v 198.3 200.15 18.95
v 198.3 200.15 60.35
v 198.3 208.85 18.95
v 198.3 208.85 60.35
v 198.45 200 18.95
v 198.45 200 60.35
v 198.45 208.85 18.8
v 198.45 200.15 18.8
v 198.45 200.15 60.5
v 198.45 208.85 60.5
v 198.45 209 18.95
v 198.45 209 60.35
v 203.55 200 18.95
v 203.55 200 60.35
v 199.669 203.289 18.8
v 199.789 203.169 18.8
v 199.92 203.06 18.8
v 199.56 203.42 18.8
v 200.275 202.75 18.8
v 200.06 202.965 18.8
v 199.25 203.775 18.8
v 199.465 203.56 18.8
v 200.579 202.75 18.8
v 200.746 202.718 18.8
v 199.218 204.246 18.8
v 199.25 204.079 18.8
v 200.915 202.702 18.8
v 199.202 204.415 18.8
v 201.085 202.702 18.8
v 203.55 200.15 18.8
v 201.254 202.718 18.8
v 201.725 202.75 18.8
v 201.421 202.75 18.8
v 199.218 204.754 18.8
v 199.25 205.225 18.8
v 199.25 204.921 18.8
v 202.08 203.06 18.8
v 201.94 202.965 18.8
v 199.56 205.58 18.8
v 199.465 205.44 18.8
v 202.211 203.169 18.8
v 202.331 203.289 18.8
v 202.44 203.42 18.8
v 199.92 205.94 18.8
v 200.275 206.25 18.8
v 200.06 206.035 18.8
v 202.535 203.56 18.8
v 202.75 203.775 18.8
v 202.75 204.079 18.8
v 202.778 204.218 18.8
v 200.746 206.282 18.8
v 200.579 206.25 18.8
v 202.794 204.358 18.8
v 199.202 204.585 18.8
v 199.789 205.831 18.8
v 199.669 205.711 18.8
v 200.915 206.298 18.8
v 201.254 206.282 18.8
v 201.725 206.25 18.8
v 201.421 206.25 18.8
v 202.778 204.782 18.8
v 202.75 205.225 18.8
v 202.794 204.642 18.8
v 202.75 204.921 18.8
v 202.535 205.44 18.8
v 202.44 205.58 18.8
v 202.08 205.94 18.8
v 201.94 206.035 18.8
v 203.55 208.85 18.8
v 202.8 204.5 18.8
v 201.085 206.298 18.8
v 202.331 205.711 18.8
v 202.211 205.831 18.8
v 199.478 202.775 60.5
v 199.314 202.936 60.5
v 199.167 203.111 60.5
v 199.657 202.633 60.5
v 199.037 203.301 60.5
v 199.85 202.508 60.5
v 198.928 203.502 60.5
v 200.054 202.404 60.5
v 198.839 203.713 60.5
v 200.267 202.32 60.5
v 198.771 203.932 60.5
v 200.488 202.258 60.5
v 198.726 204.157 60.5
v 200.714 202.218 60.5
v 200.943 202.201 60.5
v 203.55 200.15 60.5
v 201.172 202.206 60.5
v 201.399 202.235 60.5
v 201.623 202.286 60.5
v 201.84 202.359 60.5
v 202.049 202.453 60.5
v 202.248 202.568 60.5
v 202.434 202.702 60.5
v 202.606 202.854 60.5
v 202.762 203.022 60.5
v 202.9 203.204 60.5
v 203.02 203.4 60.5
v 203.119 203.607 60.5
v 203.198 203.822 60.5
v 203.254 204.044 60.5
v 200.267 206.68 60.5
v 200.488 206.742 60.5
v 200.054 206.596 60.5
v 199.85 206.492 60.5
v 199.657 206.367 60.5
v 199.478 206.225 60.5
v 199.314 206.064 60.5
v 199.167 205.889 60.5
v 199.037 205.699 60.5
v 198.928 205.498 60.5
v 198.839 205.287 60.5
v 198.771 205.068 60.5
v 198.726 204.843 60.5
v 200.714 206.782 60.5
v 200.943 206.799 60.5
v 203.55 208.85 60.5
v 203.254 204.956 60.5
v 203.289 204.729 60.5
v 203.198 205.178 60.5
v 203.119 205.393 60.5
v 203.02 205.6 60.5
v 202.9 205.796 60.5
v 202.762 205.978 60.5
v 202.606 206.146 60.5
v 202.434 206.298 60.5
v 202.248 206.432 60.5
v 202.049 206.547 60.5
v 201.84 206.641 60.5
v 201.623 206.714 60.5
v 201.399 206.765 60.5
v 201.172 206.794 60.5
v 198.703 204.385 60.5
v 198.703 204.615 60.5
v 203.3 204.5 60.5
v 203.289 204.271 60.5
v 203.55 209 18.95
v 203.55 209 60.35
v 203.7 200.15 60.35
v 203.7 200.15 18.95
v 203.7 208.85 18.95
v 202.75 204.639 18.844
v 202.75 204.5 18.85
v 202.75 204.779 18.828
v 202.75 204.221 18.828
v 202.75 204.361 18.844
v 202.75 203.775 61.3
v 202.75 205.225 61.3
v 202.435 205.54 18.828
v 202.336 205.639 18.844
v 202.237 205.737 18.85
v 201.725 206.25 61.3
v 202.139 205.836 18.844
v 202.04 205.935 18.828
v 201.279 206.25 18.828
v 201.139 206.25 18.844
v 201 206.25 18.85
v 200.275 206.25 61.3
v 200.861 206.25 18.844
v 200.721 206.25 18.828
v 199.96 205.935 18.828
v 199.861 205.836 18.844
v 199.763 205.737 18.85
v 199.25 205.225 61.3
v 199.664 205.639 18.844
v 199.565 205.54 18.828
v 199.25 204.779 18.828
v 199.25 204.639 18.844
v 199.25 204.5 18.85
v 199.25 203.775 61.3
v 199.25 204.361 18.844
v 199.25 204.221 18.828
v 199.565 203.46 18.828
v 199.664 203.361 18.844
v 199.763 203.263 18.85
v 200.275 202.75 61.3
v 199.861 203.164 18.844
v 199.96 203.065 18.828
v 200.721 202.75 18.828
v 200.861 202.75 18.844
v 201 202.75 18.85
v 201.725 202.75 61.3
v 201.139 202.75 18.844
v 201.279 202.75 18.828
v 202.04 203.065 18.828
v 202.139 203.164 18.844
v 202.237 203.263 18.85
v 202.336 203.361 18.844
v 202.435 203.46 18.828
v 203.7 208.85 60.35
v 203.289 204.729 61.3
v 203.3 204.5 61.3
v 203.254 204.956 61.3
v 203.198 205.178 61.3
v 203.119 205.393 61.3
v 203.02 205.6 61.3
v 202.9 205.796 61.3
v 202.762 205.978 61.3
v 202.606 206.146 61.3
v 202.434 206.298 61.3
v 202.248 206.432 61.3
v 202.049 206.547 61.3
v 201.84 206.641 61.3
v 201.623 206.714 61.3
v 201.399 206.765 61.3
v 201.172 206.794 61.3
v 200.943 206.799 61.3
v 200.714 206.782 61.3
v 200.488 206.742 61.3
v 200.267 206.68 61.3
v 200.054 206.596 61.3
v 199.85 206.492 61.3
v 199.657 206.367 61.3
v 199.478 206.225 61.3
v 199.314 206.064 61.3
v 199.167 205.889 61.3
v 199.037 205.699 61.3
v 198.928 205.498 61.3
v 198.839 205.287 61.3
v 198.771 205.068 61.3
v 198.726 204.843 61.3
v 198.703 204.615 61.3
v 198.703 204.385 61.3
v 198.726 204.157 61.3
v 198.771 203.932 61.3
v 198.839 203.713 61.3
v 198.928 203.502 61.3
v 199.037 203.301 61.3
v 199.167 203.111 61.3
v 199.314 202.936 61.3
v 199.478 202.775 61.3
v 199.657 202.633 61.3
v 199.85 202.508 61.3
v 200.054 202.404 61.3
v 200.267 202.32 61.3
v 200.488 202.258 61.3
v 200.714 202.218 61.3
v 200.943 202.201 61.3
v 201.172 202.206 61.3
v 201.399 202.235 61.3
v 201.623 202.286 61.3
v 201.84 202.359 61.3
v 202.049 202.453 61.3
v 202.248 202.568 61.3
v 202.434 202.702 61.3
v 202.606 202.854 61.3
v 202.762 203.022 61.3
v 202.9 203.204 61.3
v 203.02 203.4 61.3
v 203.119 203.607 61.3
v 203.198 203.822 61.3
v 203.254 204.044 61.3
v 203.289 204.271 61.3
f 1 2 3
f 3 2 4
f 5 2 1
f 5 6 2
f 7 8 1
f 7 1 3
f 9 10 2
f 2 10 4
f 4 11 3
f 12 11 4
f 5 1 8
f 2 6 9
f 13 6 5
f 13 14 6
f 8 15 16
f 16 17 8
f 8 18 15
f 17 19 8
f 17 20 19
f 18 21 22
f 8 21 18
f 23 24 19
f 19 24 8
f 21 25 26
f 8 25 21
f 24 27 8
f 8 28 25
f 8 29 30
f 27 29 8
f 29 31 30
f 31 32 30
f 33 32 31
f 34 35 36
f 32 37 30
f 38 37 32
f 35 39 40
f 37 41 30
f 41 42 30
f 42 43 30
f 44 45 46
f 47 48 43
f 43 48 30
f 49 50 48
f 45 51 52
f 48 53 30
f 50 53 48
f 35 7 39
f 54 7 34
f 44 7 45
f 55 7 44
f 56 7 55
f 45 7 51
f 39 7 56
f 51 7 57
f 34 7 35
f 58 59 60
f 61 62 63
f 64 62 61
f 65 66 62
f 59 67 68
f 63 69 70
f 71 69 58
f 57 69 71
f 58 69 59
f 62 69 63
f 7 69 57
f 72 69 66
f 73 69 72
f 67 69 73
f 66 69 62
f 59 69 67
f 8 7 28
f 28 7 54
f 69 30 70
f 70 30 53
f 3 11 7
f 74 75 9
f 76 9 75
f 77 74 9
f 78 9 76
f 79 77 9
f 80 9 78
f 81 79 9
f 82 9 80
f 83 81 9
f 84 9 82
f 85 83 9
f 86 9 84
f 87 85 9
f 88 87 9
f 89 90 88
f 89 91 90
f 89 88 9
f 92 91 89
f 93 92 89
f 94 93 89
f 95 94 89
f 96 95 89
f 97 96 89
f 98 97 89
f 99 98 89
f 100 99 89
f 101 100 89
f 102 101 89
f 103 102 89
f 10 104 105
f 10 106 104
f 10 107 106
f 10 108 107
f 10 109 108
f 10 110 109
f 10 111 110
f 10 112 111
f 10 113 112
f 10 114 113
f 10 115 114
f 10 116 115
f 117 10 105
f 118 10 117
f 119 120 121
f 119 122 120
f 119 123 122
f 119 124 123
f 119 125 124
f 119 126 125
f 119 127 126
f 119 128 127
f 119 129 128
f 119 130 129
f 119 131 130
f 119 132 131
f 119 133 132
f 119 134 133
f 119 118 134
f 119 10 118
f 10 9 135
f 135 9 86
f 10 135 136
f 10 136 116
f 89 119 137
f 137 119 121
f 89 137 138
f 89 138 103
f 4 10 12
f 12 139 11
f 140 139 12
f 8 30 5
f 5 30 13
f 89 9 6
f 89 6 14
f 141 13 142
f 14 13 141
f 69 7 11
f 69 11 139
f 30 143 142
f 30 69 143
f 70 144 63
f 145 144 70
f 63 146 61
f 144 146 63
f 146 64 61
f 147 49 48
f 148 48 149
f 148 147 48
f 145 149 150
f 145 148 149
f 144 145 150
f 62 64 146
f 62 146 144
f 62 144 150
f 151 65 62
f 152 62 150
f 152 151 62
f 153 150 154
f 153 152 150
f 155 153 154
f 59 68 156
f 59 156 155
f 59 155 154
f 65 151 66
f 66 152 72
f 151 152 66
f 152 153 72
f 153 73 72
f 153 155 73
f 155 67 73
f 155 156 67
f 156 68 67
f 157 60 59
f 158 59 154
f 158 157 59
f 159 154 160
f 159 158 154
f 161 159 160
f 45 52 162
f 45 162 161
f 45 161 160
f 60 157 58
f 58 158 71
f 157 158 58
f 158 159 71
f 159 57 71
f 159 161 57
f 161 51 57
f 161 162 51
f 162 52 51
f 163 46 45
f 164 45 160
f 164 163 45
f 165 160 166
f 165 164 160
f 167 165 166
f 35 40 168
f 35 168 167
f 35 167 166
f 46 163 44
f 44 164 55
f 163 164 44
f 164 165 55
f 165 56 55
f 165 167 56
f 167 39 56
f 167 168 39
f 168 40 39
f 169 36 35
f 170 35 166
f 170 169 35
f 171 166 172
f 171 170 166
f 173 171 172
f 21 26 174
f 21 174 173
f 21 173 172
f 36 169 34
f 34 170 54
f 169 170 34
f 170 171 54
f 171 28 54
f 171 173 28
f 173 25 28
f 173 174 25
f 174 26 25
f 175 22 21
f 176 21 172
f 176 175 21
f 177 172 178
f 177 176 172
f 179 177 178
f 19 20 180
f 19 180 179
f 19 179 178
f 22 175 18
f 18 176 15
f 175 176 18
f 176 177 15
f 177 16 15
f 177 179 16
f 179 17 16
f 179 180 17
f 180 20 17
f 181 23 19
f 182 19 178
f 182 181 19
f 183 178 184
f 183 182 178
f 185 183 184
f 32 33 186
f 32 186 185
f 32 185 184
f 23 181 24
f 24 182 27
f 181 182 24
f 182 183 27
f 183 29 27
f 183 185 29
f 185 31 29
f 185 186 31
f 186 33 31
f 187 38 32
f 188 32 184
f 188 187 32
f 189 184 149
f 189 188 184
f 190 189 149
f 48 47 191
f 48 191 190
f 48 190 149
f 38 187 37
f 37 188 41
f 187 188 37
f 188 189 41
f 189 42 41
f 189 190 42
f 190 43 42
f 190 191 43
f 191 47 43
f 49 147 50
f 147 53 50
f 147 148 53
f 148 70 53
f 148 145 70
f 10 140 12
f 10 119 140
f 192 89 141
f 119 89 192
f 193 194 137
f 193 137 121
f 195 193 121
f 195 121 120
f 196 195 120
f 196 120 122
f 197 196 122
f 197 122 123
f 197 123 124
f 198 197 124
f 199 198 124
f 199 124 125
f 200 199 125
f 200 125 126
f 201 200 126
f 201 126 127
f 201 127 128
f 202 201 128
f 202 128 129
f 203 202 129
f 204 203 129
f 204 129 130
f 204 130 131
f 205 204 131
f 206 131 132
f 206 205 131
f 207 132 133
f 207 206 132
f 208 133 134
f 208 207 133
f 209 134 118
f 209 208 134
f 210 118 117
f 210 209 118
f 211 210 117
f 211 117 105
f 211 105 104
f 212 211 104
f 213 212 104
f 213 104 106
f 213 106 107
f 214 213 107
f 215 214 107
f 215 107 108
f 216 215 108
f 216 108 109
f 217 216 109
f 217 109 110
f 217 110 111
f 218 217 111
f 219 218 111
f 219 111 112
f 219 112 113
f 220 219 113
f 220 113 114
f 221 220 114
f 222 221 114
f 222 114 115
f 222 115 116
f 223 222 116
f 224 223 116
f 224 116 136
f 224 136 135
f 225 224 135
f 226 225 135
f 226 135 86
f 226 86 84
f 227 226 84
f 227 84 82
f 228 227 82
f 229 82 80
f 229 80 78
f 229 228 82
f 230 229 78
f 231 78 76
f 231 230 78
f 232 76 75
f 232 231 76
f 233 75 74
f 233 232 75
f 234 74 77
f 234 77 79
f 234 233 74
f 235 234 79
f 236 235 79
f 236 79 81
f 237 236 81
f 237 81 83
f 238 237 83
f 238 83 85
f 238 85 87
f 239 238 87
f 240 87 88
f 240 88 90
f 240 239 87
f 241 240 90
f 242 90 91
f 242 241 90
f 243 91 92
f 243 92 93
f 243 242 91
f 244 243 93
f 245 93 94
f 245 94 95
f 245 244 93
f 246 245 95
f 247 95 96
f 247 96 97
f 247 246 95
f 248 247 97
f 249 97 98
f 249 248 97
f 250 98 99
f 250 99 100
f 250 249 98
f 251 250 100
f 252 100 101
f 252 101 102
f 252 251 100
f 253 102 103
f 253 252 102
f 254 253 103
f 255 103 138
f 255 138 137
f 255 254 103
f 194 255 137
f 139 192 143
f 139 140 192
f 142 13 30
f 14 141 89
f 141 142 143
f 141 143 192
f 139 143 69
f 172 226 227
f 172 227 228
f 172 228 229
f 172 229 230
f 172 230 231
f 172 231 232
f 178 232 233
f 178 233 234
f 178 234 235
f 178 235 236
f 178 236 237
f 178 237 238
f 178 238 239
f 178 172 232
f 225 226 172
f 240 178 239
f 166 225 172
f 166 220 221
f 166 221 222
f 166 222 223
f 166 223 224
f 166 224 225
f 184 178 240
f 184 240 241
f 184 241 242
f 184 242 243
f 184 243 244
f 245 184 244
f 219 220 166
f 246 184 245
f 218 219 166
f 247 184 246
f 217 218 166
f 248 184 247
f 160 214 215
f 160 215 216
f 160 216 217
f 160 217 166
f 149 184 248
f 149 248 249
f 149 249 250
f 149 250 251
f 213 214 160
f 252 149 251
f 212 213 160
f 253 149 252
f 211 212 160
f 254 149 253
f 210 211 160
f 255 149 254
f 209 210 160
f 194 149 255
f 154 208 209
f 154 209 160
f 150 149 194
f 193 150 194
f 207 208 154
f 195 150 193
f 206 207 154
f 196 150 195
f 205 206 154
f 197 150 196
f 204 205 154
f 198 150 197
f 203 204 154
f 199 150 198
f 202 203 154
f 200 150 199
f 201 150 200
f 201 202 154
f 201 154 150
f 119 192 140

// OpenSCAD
// Generated by the canonical parent Python sources and validated exchange pipeline.
polyhedron(points=[[198.3000030517578, 200.14999389648438, 18.950000762939453], [198.3000030517578, 200.14999389648438, 60.349998474121094], [198.3000030517578, 208.85000610351562, 18.950000762939453], [198.3000030517578, 208.85000610351562, 60.349998474121094], [198.4499969482422, 200.0, 18.950000762939453], [198.4499969482422, 200.0, 60.349998474121094], [198.4499969482422, 208.85000610351562, 18.799999237060547], [198.4499969482422, 200.14999389648438, 18.799999237060547], [198.4499969482422, 200.14999389648438, 60.5], [198.4499969482422, 208.85000610351562, 60.5], [198.4499969482422, 209.0, 18.950000762939453], [198.4499969482422, 209.0, 60.349998474121094], [203.5500030517578, 200.0, 18.950000762939453], [203.5500030517578, 200.0, 60.349998474121094], [199.66851806640625, 203.2887420654297, 18.799999237060547], [199.7887420654297, 203.16851806640625, 18.799999237060547], [199.91978454589844, 203.06016540527344, 18.799999237060547], [199.56016540527344, 203.41978454589844, 18.799999237060547], [200.27513122558594, 202.75, 18.799999237060547], [200.0604705810547, 202.96466064453125, 18.799999237060547], [199.25, 203.77513122558594, 18.799999237060547], [199.46466064453125, 203.5604705810547, 18.799999237060547], [200.5786895751953, 202.75, 18.799999237060547], [200.74569702148438, 202.71804809570312, 18.799999237060547], [199.21804809570312, 204.24569702148438, 18.799999237060547], [199.25, 204.0786895751953, 18.799999237060547], [200.91497802734375, 202.70201110839844, 18.799999237060547], [199.20201110839844, 204.41497802734375, 18.799999237060547], [201.08502197265625, 202.70201110839844, 18.799999237060547], [203.5500030517578, 200.14999389648438, 18.799999237060547], [201.25430297851562, 202.71804809570312, 18.799999237060547], [201.72486877441406, 202.75, 18.799999237060547], [201.4213104248047, 202.75, 18.799999237060547], [199.21804809570312, 204.75430297851562, 18.799999237060547], [199.25, 205.22486877441406, 18.799999237060547], [199.25, 204.9213104248047, 18.799999237060547], [202.08021545410156, 203.06016540527344, 18.799999237060547], [201.9395294189453, 202.96466064453125, 18.799999237060547], [199.56016540527344, 205.58021545410156, 18.799999237060547], [199.46466064453125, 205.4395294189453, 18.799999237060547], [202.2112579345703, 203.16851806640625, 18.799999237060547], [202.33148193359375, 203.2887420654297, 18.799999237060547], [202.43983459472656, 203.41978454589844, 18.799999237060547], [199.91978454589844, 205.93983459472656, 18.799999237060547], [200.27513122558594, 206.25, 18.799999237060547], [200.0604705810547, 206.03533935546875, 18.799999237060547], [202.53533935546875, 203.5604705810547, 18.799999237060547], [202.75, 203.77513122558594, 18.799999237060547], [202.75, 204.0786895751953, 18.799999237060547], [202.77772521972656, 204.21766662597656, 18.799999237060547], [200.74569702148438, 206.28195190429688, 18.799999237060547], [200.5786895751953, 206.25, 18.799999237060547], [202.79441833496094, 204.3583984375, 18.799999237060547], [199.20201110839844, 204.58502197265625, 18.799999237060547], [199.7887420654297, 205.83148193359375, 18.799999237060547], [199.66851806640625, 205.7112579345703, 18.799999237060547], [200.91497802734375, 206.29798889160156, 18.799999237060547], [201.25430297851562, 206.28195190429688, 18.799999237060547], [201.72486877441406, 206.25, 18.799999237060547], [201.4213104248047, 206.25, 18.799999237060547], [202.77772521972656, 204.78233337402344, 18.799999237060547], [202.75, 205.22486877441406, 18.799999237060547], [202.79441833496094, 204.6416015625, 18.799999237060547], [202.75, 204.9213104248047, 18.799999237060547], [202.53533935546875, 205.4395294189453, 18.799999237060547], [202.43983459472656, 205.58021545410156, 18.799999237060547], [202.08021545410156, 205.93983459472656, 18.799999237060547], [201.9395294189453, 206.03533935546875, 18.799999237060547], [203.5500030517578, 208.85000610351562, 18.799999237060547], [202.8000030517578, 204.5, 18.799999237060547], [201.08502197265625, 206.29798889160156, 18.799999237060547], [202.33148193359375, 205.7112579345703, 18.799999237060547], [202.2112579345703, 205.83148193359375, 18.799999237060547], [199.47811889648438, 202.77549743652344, 60.5], [199.31398010253906, 202.93560791015625, 60.5], [199.16659545898438, 203.1112518310547, 60.5], [199.6573944091797, 202.63253784179688, 60.5], [199.0374298095703, 203.3007049560547, 60.5], [199.85000610351562, 202.50814819335938, 60.5], [198.92776489257812, 203.50205993652344, 60.5], [200.05404663085938, 202.40353393554688, 60.5], [198.83871459960938, 203.71334838867188, 60.5], [200.26748657226562, 202.31976318359375, 60.5], [198.7711181640625, 203.93246459960938, 60.5], [200.4882049560547, 202.25765991210938, 60.5], [198.72569274902344, 204.15719604492188, 60.5], [200.71400451660156, 202.2178497314453, 60.5], [200.94265747070312, 202.20071411132812, 60.5], [203.5500030517578, 200.14999389648438, 60.5], [201.171875, 202.20643615722656, 60.5], [201.39938354492188, 202.2349395751953, 60.5], [201.62294006347656, 202.2859649658203, 60.5], [201.8402862548828, 202.35899353027344, 60.5], [202.04928588867188, 202.4532928466797, 60.5], [202.24786376953125, 202.5679473876953, 60.5], [202.43402099609375, 202.7017822265625, 60.5], [202.60594177246094, 202.85350036621094, 60.5], [202.76190185546875, 203.02159118652344, 60.5], [202.9003448486328, 203.20436096191406, 60.5], [203.01991271972656, 203.40000915527344, 60.5], [203.11940002441406, 203.60659790039062, 60.5], [203.19781494140625, 203.8220672607422, 60.5], [203.25439453125, 204.0442657470703, 60.5], [200.26748657226562, 206.68023681640625, 60.5], [200.4882049560547, 206.74234008789062, 60.5], [200.05404663085938, 206.59646606445312, 60.5], [199.85000610351562, 206.49185180664062, 60.5], [199.6573944091797, 206.36746215820312, 60.5], [199.47811889648438, 206.22450256347656, 60.5], [199.31398010253906, 206.06439208984375, 60.5], [199.16659545898438, 205.8887481689453, 60.5], [199.0374298095703, 205.6992950439453, 60.5], [198.92776489257812, 205.49794006347656, 60.5], [198.83871459960938, 205.28665161132812, 60.5], [198.7711181640625, 205.06753540039062, 60.5], [198.72569274902344, 204.84280395507812, 60.5], [200.71400451660156, 206.7821502685547, 60.5], [200.94265747070312, 206.79928588867188, 60.5], [203.5500030517578, 208.85000610351562, 60.5], [203.25439453125, 204.9557342529297, 60.5], [203.28857421875, 204.72900390625, 60.5], [203.19781494140625, 205.1779327392578, 60.5], [203.11940002441406, 205.39340209960938, 60.5], [203.01991271972656, 205.59999084472656, 60.5], [202.9003448486328, 205.79563903808594, 60.5], [202.76190185546875, 205.97840881347656, 60.5], [202.60594177246094, 206.14649963378906, 60.5], [202.43402099609375, 206.2982177734375, 60.5], [202.24786376953125, 206.4320526123047, 60.5], [202.04928588867188, 206.5467071533203, 60.5], [201.8402862548828, 206.64100646972656, 60.5], [201.62294006347656, 206.7140350341797, 60.5], [201.39938354492188, 206.7650604248047, 60.5], [201.171875, 206.79356384277344, 60.5], [198.70286560058594, 204.38536071777344, 60.5], [198.70286560058594, 204.61463928222656, 60.5], [203.3000030517578, 204.5, 60.5], [203.28857421875, 204.27099609375, 60.5], [203.5500030517578, 209.0, 18.950000762939453], [203.5500030517578, 209.0, 60.349998474121094], [203.6999969482422, 200.14999389648438, 60.349998474121094], [203.6999969482422, 200.14999389648438, 18.950000762939453], [203.6999969482422, 208.85000610351562, 18.950000762939453], [202.75, 204.63926696777344, 18.844467163085938], [202.75, 204.5, 18.850000381469727], [202.75, 204.77940368652344, 18.827836990356445], [202.75, 204.22059631347656, 18.827836990356445], [202.75, 204.36073303222656, 18.844467163085938], [202.75, 203.77513122558594, 61.29999923706055], [202.75, 205.22486877441406, 61.29999923706055], [202.43499755859375, 205.5398712158203, 18.827836990356445], [202.33590698242188, 205.6389617919922, 18.844467163085938], [202.23744201660156, 205.73744201660156, 18.850000381469727], [201.72486877441406, 206.25, 61.29999923706055], [202.1389617919922, 205.83590698242188, 18.844467163085938], [202.0398712158203, 205.93499755859375, 18.827836990356445], [201.27940368652344, 206.25, 18.827836990356445], [201.13926696777344, 206.25, 18.844467163085938], [201.0, 206.25, 18.850000381469727], [200.27513122558594, 206.25, 61.29999923706055], [200.86073303222656, 206.25, 18.844467163085938], [200.72059631347656, 206.25, 18.827836990356445], [199.9601287841797, 205.93499755859375, 18.827836990356445], [199.8610382080078, 205.83590698242188, 18.844467163085938], [199.76255798339844, 205.73744201660156, 18.850000381469727], [199.25, 205.22486877441406, 61.29999923706055], [199.66409301757812, 205.6389617919922, 18.844467163085938], [199.56500244140625, 205.5398712158203, 18.827836990356445], [199.25, 204.77940368652344, 18.827836990356445], [199.25, 204.63926696777344, 18.844467163085938], [199.25, 204.5, 18.850000381469727], [199.25, 203.77513122558594, 61.29999923706055], [199.25, 204.36073303222656, 18.844467163085938], [199.25, 204.22059631347656, 18.827836990356445], [199.56500244140625, 203.4601287841797, 18.827836990356445], [199.66409301757812, 203.3610382080078, 18.844467163085938], [199.76255798339844, 203.26255798339844, 18.850000381469727], [200.27513122558594, 202.75, 61.29999923706055], [199.8610382080078, 203.16409301757812, 18.844467163085938], [199.9601287841797, 203.06500244140625, 18.827836990356445], [200.72059631347656, 202.75, 18.827836990356445], [200.86073303222656, 202.75, 18.844467163085938], [201.0, 202.75, 18.850000381469727], [201.72486877441406, 202.75, 61.29999923706055], [201.13926696777344, 202.75, 18.844467163085938], [201.27940368652344, 202.75, 18.827836990356445], [202.0398712158203, 203.06500244140625, 18.827836990356445], [202.1389617919922, 203.16409301757812, 18.844467163085938], [202.23744201660156, 203.26255798339844, 18.850000381469727], [202.33590698242188, 203.3610382080078, 18.844467163085938], [202.43499755859375, 203.4601287841797, 18.827836990356445], [203.6999969482422, 208.85000610351562, 60.349998474121094], [203.28857421875, 204.72900390625, 61.29999923706055], [203.3000030517578, 204.5, 61.29999923706055], [203.25439453125, 204.9557342529297, 61.29999923706055], [203.19781494140625, 205.1779327392578, 61.29999923706055], [203.11940002441406, 205.39340209960938, 61.29999923706055], [203.01991271972656, 205.59999084472656, 61.29999923706055], [202.9003448486328, 205.79563903808594, 61.29999923706055], [202.76190185546875, 205.97840881347656, 61.29999923706055], [202.60594177246094, 206.14649963378906, 61.29999923706055], [202.43402099609375, 206.2982177734375, 61.29999923706055], [202.24786376953125, 206.4320526123047, 61.29999923706055], [202.04928588867188, 206.5467071533203, 61.29999923706055], [201.8402862548828, 206.64100646972656, 61.29999923706055], [201.62294006347656, 206.7140350341797, 61.29999923706055], [201.39938354492188, 206.7650604248047, 61.29999923706055], [201.171875, 206.79356384277344, 61.29999923706055], [200.94265747070312, 206.79928588867188, 61.29999923706055], [200.71400451660156, 206.7821502685547, 61.29999923706055], [200.4882049560547, 206.74234008789062, 61.29999923706055], [200.26748657226562, 206.68023681640625, 61.29999923706055], [200.05404663085938, 206.59646606445312, 61.29999923706055], [199.85000610351562, 206.49185180664062, 61.29999923706055], [199.6573944091797, 206.36746215820312, 61.29999923706055], [199.47811889648438, 206.22450256347656, 61.29999923706055], [199.31398010253906, 206.06439208984375, 61.29999923706055], [199.16659545898438, 205.8887481689453, 61.29999923706055], [199.0374298095703, 205.6992950439453, 61.29999923706055], [198.92776489257812, 205.49794006347656, 61.29999923706055], [198.83871459960938, 205.28665161132812, 61.29999923706055], [198.7711181640625, 205.06753540039062, 61.29999923706055], [198.72569274902344, 204.84280395507812, 61.29999923706055], [198.70286560058594, 204.61463928222656, 61.29999923706055], [198.70286560058594, 204.38536071777344, 61.29999923706055], [198.72569274902344, 204.15719604492188, 61.29999923706055], [198.7711181640625, 203.93246459960938, 61.29999923706055], [198.83871459960938, 203.71334838867188, 61.29999923706055], [198.92776489257812, 203.50205993652344, 61.29999923706055], [199.0374298095703, 203.3007049560547, 61.29999923706055], [199.16659545898438, 203.1112518310547, 61.29999923706055], [199.31398010253906, 202.93560791015625, 61.29999923706055], [199.47811889648438, 202.77549743652344, 61.29999923706055], [199.6573944091797, 202.63253784179688, 61.29999923706055], [199.85000610351562, 202.50814819335938, 61.29999923706055], [200.05404663085938, 202.40353393554688, 61.29999923706055], [200.26748657226562, 202.31976318359375, 61.29999923706055], [200.4882049560547, 202.25765991210938, 61.29999923706055], [200.71400451660156, 202.2178497314453, 61.29999923706055], [200.94265747070312, 202.20071411132812, 61.29999923706055], [201.171875, 202.20643615722656, 61.29999923706055], [201.39938354492188, 202.2349395751953, 61.29999923706055], [201.62294006347656, 202.2859649658203, 61.29999923706055], [201.8402862548828, 202.35899353027344, 61.29999923706055], [202.04928588867188, 202.4532928466797, 61.29999923706055], [202.24786376953125, 202.5679473876953, 61.29999923706055], [202.43402099609375, 202.7017822265625, 61.29999923706055], [202.60594177246094, 202.85350036621094, 61.29999923706055], [202.76190185546875, 203.02159118652344, 61.29999923706055], [202.9003448486328, 203.20436096191406, 61.29999923706055], [203.01991271972656, 203.40000915527344, 61.29999923706055], [203.11940002441406, 203.60659790039062, 61.29999923706055], [203.19781494140625, 203.8220672607422, 61.29999923706055], [203.25439453125, 204.0442657470703, 61.29999923706055], [203.28857421875, 204.27099609375, 61.29999923706055]],faces=[[2, 1, 0], [3, 1, 2], [0, 1, 4], [1, 5, 4], [0, 7, 6], [2, 0, 6], [1, 9, 8], [3, 9, 1], [2, 10, 3], [3, 10, 11], [7, 0, 4], [8, 5, 1], [4, 5, 12], [5, 13, 12], [15, 14, 7], [7, 16, 15], [14, 17, 7], [7, 18, 16], [18, 19, 16], [21, 20, 17], [17, 20, 7], [18, 23, 22], [7, 23, 18], [25, 24, 20], [20, 24, 7], [7, 26, 23], [24, 27, 7], [29, 28, 7], [7, 28, 26], [29, 30, 28], [29, 31, 30], [30, 31, 32], [35, 34, 33], [29, 36, 31], [31, 36, 37], [39, 38, 34], [29, 40, 36], [29, 41, 40], [29, 42, 41], [45, 44, 43], [42, 47, 46], [29, 47, 42], [47, 49, 48], [51, 50, 44], [29, 52, 47], [47, 52, 49], [38, 6, 34], [33, 6, 53], [44, 6, 43], [43, 6, 54], [54, 6, 55], [50, 6, 44], [55, 6, 38], [56, 6, 50], [34, 6, 33], [59, 58, 57], [62, 61, 60], [60, 61, 63], [61, 65, 64], [67, 66, 58], [69, 68, 62], [57, 68, 70], [70, 68, 56], [58, 68, 57], [62, 68, 61], [56, 68, 6], [65, 68, 71], [71, 68, 72], [72, 68, 66], [61, 68, 65], [66, 68, 58], [27, 6, 7], [53, 6, 27], [69, 29, 68], [52, 29, 69], [6, 10, 2], [8, 74, 73], [74, 8, 75], [8, 73, 76], [75, 8, 77], [8, 76, 78], [77, 8, 79], [8, 78, 80], [79, 8, 81], [8, 80, 82], [81, 8, 83], [8, 82, 84], [83, 8, 85], [8, 84, 86], [8, 86, 87], [87, 89, 88], [89, 90, 88], [8, 87, 88], [88, 90, 91], [88, 91, 92], [88, 92, 93], [88, 93, 94], [88, 94, 95], [88, 95, 96], [88, 96, 97], [88, 97, 98], [88, 98, 99], [88, 99, 100], [88, 100, 101], [88, 101, 102], [104, 103, 9], [103, 105, 9], [105, 106, 9], [106, 107, 9], [107, 108, 9], [108, 109, 9], [109, 110, 9], [110, 111, 9], [111, 112, 9], [112, 113, 9], [113, 114, 9], [114, 115, 9], [104, 9, 116], [116, 9, 117], [120, 119, 118], [119, 121, 118], [121, 122, 118], [122, 123, 118], [123, 124, 118], [124, 125, 118], [125, 126, 118], [126, 127, 118], [127, 128, 118], [128, 129, 118], [129, 130, 118], [130, 131, 118], [131, 132, 118], [132, 133, 118], [133, 117, 118], [117, 9, 118], [134, 8, 9], [85, 8, 134], [135, 134, 9], [115, 135, 9], [136, 118, 88], [120, 118, 136], [137, 136, 88], [102, 137, 88], [11, 9, 3], [10, 138, 11], [11, 138, 139], [4, 29, 7], [12, 29, 4], [5, 8, 88], [13, 5, 88], [141, 12, 140], [140, 12, 13], [10, 6, 68], [138, 10, 68], [141, 142, 29], [142, 68, 29], [62, 143, 69], [69, 143, 144], [60, 145, 62], [62, 145, 143], [60, 63, 145], [47, 48, 146], [148, 47, 147], [47, 146, 147], [149, 148, 144], [148, 147, 144], [149, 144, 143], [145, 63, 61], [143, 145, 61], [149, 143, 61], [61, 64, 150], [149, 61, 151], [61, 150, 151], [153, 149, 152], [149, 151, 152], [153, 152, 154], [155, 67, 58], [154, 155, 58], [153, 154, 58], [65, 150, 64], [71, 151, 65], [65, 151, 150], [71, 152, 151], [71, 72, 152], [72, 154, 152], [72, 66, 154], [66, 155, 154], [66, 67, 155], [58, 59, 156], [153, 58, 157], [58, 156, 157], [159, 153, 158], [153, 157, 158], [159, 158, 160], [161, 51, 44], [160, 161, 44], [159, 160, 44], [57, 156, 59], [70, 157, 57], [57, 157, 156], [70, 158, 157], [70, 56, 158], [56, 160, 158], [56, 50, 160], [50, 161, 160], [50, 51, 161], [44, 45, 162], [159, 44, 163], [44, 162, 163], [165, 159, 164], [159, 163, 164], [165, 164, 166], [167, 39, 34], [166, 167, 34], [165, 166, 34], [43, 162, 45], [54, 163, 43], [43, 163, 162], [54, 164, 163], [54, 55, 164], [55, 166, 164], [55, 38, 166], [38, 167, 166], [38, 39, 167], [34, 35, 168], [165, 34, 169], [34, 168, 169], [171, 165, 170], [165, 169, 170], [171, 170, 172], [173, 25, 20], [172, 173, 20], [171, 172, 20], [33, 168, 35], [53, 169, 33], [33, 169, 168], [53, 170, 169], [53, 27, 170], [27, 172, 170], [27, 24, 172], [24, 173, 172], [24, 25, 173], [20, 21, 174], [171, 20, 175], [20, 174, 175], [177, 171, 176], [171, 175, 176], [177, 176, 178], [179, 19, 18], [178, 179, 18], [177, 178, 18], [17, 174, 21], [14, 175, 17], [17, 175, 174], [14, 176, 175], [14, 15, 176], [15, 178, 176], [15, 16, 178], [16, 179, 178], [16, 19, 179], [18, 22, 180], [177, 18, 181], [18, 180, 181], [183, 177, 182], [177, 181, 182], [183, 182, 184], [185, 32, 31], [184, 185, 31], [183, 184, 31], [23, 180, 22], [26, 181, 23], [23, 181, 180], [26, 182, 181], [26, 28, 182], [28, 184, 182], [28, 30, 184], [30, 185, 184], [30, 32, 185], [31, 37, 186], [183, 31, 187], [31, 186, 187], [148, 183, 188], [183, 187, 188], [148, 188, 189], [190, 46, 47], [189, 190, 47], [148, 189, 47], [36, 186, 37], [40, 187, 36], [36, 187, 186], [40, 188, 187], [40, 41, 188], [41, 189, 188], [41, 42, 189], [42, 190, 189], [42, 46, 190], [49, 146, 48], [49, 52, 146], [52, 147, 146], [52, 69, 147], [69, 144, 147], [11, 139, 9], [139, 118, 9], [140, 88, 191], [191, 88, 118], [136, 193, 192], [120, 136, 192], [120, 192, 194], [119, 120, 194], [119, 194, 195], [121, 119, 195], [121, 195, 196], [122, 121, 196], [123, 122, 196], [123, 196, 197], [123, 197, 198], [124, 123, 198], [124, 198, 199], [125, 124, 199], [125, 199, 200], [126, 125, 200], [127, 126, 200], [127, 200, 201], [128, 127, 201], [128, 201, 202], [128, 202, 203], [129, 128, 203], [130, 129, 203], [130, 203, 204], [131, 130, 205], [130, 204, 205], [132, 131, 206], [131, 205, 206], [133, 132, 207], [132, 206, 207], [117, 133, 208], [133, 207, 208], [116, 117, 209], [117, 208, 209], [116, 209, 210], [104, 116, 210], [103, 104, 210], [103, 210, 211], [103, 211, 212], [105, 103, 212], [106, 105, 212], [106, 212, 213], [106, 213, 214], [107, 106, 214], [107, 214, 215], [108, 107, 215], [108, 215, 216], [109, 108, 216], [110, 109, 216], [110, 216, 217], [110, 217, 218], [111, 110, 218], [112, 111, 218], [112, 218, 219], [113, 112, 219], [113, 219, 220], [113, 220, 221], [114, 113, 221], [115, 114, 221], [115, 221, 222], [115, 222, 223], [135, 115, 223], [134, 135, 223], [134, 223, 224], [134, 224, 225], [85, 134, 225], [83, 85, 225], [83, 225, 226], [81, 83, 226], [81, 226, 227], [79, 81, 228], [77, 79, 228], [81, 227, 228], [77, 228, 229], [75, 77, 230], [77, 229, 230], [74, 75, 231], [75, 230, 231], [73, 74, 232], [74, 231, 232], [76, 73, 233], [78, 76, 233], [73, 232, 233], [78, 233, 234], [78, 234, 235], [80, 78, 235], [80, 235, 236], [82, 80, 236], [82, 236, 237], [84, 82, 237], [86, 84, 237], [86, 237, 238], [87, 86, 239], [89, 87, 239], [86, 238, 239], [89, 239, 240], [90, 89, 241], [89, 240, 241], [91, 90, 242], [92, 91, 242], [90, 241, 242], [92, 242, 243], [93, 92, 244], [94, 93, 244], [92, 243, 244], [94, 244, 245], [95, 94, 246], [96, 95, 246], [94, 245, 246], [96, 246, 247], [97, 96, 248], [96, 247, 248], [98, 97, 249], [99, 98, 249], [97, 248, 249], [99, 249, 250], [100, 99, 251], [101, 100, 251], [99, 250, 251], [102, 101, 252], [101, 251, 252], [102, 252, 253], [137, 102, 254], [136, 137, 254], [102, 253, 254], [136, 254, 193], [142, 191, 138], [191, 139, 138], [29, 12, 141], [88, 140, 13], [142, 141, 140], [191, 142, 140], [68, 142, 138], [226, 225, 171], [227, 226, 171], [228, 227, 171], [229, 228, 171], [230, 229, 171], [231, 230, 171], [232, 231, 177], [233, 232, 177], [234, 233, 177], [235, 234, 177], [236, 235, 177], [237, 236, 177], [238, 237, 177], [231, 171, 177], [171, 225, 224], [238, 177, 239], [171, 224, 165], [220, 219, 165], [221, 220, 165], [222, 221, 165], [223, 222, 165], [224, 223, 165], [239, 177, 183], [240, 239, 183], [241, 240, 183], [242, 241, 183], [243, 242, 183], [243, 183, 244], [165, 219, 218], [244, 183, 245], [165, 218, 217], [245, 183, 246], [165, 217, 216], [246, 183, 247], [214, 213, 159], [215, 214, 159], [216, 215, 159], [165, 216, 159], [247, 183, 148], [248, 247, 148], [249, 248, 148], [250, 249, 148], [159, 213, 212], [250, 148, 251], [159, 212, 211], [251, 148, 252], [159, 211, 210], [252, 148, 253], [159, 210, 209], [253, 148, 254], [159, 209, 208], [254, 148, 193], [208, 207, 153], [159, 208, 153], [193, 148, 149], [193, 149, 192], [153, 207, 206], [192, 149, 194], [153, 206, 205], [194, 149, 195], [153, 205, 204], [195, 149, 196], [153, 204, 203], [196, 149, 197], [153, 203, 202], [197, 149, 198], [153, 202, 201], [198, 149, 199], [199, 149, 200], [153, 201, 200], [149, 153, 200], [139, 191, 118]],convexity=10);
